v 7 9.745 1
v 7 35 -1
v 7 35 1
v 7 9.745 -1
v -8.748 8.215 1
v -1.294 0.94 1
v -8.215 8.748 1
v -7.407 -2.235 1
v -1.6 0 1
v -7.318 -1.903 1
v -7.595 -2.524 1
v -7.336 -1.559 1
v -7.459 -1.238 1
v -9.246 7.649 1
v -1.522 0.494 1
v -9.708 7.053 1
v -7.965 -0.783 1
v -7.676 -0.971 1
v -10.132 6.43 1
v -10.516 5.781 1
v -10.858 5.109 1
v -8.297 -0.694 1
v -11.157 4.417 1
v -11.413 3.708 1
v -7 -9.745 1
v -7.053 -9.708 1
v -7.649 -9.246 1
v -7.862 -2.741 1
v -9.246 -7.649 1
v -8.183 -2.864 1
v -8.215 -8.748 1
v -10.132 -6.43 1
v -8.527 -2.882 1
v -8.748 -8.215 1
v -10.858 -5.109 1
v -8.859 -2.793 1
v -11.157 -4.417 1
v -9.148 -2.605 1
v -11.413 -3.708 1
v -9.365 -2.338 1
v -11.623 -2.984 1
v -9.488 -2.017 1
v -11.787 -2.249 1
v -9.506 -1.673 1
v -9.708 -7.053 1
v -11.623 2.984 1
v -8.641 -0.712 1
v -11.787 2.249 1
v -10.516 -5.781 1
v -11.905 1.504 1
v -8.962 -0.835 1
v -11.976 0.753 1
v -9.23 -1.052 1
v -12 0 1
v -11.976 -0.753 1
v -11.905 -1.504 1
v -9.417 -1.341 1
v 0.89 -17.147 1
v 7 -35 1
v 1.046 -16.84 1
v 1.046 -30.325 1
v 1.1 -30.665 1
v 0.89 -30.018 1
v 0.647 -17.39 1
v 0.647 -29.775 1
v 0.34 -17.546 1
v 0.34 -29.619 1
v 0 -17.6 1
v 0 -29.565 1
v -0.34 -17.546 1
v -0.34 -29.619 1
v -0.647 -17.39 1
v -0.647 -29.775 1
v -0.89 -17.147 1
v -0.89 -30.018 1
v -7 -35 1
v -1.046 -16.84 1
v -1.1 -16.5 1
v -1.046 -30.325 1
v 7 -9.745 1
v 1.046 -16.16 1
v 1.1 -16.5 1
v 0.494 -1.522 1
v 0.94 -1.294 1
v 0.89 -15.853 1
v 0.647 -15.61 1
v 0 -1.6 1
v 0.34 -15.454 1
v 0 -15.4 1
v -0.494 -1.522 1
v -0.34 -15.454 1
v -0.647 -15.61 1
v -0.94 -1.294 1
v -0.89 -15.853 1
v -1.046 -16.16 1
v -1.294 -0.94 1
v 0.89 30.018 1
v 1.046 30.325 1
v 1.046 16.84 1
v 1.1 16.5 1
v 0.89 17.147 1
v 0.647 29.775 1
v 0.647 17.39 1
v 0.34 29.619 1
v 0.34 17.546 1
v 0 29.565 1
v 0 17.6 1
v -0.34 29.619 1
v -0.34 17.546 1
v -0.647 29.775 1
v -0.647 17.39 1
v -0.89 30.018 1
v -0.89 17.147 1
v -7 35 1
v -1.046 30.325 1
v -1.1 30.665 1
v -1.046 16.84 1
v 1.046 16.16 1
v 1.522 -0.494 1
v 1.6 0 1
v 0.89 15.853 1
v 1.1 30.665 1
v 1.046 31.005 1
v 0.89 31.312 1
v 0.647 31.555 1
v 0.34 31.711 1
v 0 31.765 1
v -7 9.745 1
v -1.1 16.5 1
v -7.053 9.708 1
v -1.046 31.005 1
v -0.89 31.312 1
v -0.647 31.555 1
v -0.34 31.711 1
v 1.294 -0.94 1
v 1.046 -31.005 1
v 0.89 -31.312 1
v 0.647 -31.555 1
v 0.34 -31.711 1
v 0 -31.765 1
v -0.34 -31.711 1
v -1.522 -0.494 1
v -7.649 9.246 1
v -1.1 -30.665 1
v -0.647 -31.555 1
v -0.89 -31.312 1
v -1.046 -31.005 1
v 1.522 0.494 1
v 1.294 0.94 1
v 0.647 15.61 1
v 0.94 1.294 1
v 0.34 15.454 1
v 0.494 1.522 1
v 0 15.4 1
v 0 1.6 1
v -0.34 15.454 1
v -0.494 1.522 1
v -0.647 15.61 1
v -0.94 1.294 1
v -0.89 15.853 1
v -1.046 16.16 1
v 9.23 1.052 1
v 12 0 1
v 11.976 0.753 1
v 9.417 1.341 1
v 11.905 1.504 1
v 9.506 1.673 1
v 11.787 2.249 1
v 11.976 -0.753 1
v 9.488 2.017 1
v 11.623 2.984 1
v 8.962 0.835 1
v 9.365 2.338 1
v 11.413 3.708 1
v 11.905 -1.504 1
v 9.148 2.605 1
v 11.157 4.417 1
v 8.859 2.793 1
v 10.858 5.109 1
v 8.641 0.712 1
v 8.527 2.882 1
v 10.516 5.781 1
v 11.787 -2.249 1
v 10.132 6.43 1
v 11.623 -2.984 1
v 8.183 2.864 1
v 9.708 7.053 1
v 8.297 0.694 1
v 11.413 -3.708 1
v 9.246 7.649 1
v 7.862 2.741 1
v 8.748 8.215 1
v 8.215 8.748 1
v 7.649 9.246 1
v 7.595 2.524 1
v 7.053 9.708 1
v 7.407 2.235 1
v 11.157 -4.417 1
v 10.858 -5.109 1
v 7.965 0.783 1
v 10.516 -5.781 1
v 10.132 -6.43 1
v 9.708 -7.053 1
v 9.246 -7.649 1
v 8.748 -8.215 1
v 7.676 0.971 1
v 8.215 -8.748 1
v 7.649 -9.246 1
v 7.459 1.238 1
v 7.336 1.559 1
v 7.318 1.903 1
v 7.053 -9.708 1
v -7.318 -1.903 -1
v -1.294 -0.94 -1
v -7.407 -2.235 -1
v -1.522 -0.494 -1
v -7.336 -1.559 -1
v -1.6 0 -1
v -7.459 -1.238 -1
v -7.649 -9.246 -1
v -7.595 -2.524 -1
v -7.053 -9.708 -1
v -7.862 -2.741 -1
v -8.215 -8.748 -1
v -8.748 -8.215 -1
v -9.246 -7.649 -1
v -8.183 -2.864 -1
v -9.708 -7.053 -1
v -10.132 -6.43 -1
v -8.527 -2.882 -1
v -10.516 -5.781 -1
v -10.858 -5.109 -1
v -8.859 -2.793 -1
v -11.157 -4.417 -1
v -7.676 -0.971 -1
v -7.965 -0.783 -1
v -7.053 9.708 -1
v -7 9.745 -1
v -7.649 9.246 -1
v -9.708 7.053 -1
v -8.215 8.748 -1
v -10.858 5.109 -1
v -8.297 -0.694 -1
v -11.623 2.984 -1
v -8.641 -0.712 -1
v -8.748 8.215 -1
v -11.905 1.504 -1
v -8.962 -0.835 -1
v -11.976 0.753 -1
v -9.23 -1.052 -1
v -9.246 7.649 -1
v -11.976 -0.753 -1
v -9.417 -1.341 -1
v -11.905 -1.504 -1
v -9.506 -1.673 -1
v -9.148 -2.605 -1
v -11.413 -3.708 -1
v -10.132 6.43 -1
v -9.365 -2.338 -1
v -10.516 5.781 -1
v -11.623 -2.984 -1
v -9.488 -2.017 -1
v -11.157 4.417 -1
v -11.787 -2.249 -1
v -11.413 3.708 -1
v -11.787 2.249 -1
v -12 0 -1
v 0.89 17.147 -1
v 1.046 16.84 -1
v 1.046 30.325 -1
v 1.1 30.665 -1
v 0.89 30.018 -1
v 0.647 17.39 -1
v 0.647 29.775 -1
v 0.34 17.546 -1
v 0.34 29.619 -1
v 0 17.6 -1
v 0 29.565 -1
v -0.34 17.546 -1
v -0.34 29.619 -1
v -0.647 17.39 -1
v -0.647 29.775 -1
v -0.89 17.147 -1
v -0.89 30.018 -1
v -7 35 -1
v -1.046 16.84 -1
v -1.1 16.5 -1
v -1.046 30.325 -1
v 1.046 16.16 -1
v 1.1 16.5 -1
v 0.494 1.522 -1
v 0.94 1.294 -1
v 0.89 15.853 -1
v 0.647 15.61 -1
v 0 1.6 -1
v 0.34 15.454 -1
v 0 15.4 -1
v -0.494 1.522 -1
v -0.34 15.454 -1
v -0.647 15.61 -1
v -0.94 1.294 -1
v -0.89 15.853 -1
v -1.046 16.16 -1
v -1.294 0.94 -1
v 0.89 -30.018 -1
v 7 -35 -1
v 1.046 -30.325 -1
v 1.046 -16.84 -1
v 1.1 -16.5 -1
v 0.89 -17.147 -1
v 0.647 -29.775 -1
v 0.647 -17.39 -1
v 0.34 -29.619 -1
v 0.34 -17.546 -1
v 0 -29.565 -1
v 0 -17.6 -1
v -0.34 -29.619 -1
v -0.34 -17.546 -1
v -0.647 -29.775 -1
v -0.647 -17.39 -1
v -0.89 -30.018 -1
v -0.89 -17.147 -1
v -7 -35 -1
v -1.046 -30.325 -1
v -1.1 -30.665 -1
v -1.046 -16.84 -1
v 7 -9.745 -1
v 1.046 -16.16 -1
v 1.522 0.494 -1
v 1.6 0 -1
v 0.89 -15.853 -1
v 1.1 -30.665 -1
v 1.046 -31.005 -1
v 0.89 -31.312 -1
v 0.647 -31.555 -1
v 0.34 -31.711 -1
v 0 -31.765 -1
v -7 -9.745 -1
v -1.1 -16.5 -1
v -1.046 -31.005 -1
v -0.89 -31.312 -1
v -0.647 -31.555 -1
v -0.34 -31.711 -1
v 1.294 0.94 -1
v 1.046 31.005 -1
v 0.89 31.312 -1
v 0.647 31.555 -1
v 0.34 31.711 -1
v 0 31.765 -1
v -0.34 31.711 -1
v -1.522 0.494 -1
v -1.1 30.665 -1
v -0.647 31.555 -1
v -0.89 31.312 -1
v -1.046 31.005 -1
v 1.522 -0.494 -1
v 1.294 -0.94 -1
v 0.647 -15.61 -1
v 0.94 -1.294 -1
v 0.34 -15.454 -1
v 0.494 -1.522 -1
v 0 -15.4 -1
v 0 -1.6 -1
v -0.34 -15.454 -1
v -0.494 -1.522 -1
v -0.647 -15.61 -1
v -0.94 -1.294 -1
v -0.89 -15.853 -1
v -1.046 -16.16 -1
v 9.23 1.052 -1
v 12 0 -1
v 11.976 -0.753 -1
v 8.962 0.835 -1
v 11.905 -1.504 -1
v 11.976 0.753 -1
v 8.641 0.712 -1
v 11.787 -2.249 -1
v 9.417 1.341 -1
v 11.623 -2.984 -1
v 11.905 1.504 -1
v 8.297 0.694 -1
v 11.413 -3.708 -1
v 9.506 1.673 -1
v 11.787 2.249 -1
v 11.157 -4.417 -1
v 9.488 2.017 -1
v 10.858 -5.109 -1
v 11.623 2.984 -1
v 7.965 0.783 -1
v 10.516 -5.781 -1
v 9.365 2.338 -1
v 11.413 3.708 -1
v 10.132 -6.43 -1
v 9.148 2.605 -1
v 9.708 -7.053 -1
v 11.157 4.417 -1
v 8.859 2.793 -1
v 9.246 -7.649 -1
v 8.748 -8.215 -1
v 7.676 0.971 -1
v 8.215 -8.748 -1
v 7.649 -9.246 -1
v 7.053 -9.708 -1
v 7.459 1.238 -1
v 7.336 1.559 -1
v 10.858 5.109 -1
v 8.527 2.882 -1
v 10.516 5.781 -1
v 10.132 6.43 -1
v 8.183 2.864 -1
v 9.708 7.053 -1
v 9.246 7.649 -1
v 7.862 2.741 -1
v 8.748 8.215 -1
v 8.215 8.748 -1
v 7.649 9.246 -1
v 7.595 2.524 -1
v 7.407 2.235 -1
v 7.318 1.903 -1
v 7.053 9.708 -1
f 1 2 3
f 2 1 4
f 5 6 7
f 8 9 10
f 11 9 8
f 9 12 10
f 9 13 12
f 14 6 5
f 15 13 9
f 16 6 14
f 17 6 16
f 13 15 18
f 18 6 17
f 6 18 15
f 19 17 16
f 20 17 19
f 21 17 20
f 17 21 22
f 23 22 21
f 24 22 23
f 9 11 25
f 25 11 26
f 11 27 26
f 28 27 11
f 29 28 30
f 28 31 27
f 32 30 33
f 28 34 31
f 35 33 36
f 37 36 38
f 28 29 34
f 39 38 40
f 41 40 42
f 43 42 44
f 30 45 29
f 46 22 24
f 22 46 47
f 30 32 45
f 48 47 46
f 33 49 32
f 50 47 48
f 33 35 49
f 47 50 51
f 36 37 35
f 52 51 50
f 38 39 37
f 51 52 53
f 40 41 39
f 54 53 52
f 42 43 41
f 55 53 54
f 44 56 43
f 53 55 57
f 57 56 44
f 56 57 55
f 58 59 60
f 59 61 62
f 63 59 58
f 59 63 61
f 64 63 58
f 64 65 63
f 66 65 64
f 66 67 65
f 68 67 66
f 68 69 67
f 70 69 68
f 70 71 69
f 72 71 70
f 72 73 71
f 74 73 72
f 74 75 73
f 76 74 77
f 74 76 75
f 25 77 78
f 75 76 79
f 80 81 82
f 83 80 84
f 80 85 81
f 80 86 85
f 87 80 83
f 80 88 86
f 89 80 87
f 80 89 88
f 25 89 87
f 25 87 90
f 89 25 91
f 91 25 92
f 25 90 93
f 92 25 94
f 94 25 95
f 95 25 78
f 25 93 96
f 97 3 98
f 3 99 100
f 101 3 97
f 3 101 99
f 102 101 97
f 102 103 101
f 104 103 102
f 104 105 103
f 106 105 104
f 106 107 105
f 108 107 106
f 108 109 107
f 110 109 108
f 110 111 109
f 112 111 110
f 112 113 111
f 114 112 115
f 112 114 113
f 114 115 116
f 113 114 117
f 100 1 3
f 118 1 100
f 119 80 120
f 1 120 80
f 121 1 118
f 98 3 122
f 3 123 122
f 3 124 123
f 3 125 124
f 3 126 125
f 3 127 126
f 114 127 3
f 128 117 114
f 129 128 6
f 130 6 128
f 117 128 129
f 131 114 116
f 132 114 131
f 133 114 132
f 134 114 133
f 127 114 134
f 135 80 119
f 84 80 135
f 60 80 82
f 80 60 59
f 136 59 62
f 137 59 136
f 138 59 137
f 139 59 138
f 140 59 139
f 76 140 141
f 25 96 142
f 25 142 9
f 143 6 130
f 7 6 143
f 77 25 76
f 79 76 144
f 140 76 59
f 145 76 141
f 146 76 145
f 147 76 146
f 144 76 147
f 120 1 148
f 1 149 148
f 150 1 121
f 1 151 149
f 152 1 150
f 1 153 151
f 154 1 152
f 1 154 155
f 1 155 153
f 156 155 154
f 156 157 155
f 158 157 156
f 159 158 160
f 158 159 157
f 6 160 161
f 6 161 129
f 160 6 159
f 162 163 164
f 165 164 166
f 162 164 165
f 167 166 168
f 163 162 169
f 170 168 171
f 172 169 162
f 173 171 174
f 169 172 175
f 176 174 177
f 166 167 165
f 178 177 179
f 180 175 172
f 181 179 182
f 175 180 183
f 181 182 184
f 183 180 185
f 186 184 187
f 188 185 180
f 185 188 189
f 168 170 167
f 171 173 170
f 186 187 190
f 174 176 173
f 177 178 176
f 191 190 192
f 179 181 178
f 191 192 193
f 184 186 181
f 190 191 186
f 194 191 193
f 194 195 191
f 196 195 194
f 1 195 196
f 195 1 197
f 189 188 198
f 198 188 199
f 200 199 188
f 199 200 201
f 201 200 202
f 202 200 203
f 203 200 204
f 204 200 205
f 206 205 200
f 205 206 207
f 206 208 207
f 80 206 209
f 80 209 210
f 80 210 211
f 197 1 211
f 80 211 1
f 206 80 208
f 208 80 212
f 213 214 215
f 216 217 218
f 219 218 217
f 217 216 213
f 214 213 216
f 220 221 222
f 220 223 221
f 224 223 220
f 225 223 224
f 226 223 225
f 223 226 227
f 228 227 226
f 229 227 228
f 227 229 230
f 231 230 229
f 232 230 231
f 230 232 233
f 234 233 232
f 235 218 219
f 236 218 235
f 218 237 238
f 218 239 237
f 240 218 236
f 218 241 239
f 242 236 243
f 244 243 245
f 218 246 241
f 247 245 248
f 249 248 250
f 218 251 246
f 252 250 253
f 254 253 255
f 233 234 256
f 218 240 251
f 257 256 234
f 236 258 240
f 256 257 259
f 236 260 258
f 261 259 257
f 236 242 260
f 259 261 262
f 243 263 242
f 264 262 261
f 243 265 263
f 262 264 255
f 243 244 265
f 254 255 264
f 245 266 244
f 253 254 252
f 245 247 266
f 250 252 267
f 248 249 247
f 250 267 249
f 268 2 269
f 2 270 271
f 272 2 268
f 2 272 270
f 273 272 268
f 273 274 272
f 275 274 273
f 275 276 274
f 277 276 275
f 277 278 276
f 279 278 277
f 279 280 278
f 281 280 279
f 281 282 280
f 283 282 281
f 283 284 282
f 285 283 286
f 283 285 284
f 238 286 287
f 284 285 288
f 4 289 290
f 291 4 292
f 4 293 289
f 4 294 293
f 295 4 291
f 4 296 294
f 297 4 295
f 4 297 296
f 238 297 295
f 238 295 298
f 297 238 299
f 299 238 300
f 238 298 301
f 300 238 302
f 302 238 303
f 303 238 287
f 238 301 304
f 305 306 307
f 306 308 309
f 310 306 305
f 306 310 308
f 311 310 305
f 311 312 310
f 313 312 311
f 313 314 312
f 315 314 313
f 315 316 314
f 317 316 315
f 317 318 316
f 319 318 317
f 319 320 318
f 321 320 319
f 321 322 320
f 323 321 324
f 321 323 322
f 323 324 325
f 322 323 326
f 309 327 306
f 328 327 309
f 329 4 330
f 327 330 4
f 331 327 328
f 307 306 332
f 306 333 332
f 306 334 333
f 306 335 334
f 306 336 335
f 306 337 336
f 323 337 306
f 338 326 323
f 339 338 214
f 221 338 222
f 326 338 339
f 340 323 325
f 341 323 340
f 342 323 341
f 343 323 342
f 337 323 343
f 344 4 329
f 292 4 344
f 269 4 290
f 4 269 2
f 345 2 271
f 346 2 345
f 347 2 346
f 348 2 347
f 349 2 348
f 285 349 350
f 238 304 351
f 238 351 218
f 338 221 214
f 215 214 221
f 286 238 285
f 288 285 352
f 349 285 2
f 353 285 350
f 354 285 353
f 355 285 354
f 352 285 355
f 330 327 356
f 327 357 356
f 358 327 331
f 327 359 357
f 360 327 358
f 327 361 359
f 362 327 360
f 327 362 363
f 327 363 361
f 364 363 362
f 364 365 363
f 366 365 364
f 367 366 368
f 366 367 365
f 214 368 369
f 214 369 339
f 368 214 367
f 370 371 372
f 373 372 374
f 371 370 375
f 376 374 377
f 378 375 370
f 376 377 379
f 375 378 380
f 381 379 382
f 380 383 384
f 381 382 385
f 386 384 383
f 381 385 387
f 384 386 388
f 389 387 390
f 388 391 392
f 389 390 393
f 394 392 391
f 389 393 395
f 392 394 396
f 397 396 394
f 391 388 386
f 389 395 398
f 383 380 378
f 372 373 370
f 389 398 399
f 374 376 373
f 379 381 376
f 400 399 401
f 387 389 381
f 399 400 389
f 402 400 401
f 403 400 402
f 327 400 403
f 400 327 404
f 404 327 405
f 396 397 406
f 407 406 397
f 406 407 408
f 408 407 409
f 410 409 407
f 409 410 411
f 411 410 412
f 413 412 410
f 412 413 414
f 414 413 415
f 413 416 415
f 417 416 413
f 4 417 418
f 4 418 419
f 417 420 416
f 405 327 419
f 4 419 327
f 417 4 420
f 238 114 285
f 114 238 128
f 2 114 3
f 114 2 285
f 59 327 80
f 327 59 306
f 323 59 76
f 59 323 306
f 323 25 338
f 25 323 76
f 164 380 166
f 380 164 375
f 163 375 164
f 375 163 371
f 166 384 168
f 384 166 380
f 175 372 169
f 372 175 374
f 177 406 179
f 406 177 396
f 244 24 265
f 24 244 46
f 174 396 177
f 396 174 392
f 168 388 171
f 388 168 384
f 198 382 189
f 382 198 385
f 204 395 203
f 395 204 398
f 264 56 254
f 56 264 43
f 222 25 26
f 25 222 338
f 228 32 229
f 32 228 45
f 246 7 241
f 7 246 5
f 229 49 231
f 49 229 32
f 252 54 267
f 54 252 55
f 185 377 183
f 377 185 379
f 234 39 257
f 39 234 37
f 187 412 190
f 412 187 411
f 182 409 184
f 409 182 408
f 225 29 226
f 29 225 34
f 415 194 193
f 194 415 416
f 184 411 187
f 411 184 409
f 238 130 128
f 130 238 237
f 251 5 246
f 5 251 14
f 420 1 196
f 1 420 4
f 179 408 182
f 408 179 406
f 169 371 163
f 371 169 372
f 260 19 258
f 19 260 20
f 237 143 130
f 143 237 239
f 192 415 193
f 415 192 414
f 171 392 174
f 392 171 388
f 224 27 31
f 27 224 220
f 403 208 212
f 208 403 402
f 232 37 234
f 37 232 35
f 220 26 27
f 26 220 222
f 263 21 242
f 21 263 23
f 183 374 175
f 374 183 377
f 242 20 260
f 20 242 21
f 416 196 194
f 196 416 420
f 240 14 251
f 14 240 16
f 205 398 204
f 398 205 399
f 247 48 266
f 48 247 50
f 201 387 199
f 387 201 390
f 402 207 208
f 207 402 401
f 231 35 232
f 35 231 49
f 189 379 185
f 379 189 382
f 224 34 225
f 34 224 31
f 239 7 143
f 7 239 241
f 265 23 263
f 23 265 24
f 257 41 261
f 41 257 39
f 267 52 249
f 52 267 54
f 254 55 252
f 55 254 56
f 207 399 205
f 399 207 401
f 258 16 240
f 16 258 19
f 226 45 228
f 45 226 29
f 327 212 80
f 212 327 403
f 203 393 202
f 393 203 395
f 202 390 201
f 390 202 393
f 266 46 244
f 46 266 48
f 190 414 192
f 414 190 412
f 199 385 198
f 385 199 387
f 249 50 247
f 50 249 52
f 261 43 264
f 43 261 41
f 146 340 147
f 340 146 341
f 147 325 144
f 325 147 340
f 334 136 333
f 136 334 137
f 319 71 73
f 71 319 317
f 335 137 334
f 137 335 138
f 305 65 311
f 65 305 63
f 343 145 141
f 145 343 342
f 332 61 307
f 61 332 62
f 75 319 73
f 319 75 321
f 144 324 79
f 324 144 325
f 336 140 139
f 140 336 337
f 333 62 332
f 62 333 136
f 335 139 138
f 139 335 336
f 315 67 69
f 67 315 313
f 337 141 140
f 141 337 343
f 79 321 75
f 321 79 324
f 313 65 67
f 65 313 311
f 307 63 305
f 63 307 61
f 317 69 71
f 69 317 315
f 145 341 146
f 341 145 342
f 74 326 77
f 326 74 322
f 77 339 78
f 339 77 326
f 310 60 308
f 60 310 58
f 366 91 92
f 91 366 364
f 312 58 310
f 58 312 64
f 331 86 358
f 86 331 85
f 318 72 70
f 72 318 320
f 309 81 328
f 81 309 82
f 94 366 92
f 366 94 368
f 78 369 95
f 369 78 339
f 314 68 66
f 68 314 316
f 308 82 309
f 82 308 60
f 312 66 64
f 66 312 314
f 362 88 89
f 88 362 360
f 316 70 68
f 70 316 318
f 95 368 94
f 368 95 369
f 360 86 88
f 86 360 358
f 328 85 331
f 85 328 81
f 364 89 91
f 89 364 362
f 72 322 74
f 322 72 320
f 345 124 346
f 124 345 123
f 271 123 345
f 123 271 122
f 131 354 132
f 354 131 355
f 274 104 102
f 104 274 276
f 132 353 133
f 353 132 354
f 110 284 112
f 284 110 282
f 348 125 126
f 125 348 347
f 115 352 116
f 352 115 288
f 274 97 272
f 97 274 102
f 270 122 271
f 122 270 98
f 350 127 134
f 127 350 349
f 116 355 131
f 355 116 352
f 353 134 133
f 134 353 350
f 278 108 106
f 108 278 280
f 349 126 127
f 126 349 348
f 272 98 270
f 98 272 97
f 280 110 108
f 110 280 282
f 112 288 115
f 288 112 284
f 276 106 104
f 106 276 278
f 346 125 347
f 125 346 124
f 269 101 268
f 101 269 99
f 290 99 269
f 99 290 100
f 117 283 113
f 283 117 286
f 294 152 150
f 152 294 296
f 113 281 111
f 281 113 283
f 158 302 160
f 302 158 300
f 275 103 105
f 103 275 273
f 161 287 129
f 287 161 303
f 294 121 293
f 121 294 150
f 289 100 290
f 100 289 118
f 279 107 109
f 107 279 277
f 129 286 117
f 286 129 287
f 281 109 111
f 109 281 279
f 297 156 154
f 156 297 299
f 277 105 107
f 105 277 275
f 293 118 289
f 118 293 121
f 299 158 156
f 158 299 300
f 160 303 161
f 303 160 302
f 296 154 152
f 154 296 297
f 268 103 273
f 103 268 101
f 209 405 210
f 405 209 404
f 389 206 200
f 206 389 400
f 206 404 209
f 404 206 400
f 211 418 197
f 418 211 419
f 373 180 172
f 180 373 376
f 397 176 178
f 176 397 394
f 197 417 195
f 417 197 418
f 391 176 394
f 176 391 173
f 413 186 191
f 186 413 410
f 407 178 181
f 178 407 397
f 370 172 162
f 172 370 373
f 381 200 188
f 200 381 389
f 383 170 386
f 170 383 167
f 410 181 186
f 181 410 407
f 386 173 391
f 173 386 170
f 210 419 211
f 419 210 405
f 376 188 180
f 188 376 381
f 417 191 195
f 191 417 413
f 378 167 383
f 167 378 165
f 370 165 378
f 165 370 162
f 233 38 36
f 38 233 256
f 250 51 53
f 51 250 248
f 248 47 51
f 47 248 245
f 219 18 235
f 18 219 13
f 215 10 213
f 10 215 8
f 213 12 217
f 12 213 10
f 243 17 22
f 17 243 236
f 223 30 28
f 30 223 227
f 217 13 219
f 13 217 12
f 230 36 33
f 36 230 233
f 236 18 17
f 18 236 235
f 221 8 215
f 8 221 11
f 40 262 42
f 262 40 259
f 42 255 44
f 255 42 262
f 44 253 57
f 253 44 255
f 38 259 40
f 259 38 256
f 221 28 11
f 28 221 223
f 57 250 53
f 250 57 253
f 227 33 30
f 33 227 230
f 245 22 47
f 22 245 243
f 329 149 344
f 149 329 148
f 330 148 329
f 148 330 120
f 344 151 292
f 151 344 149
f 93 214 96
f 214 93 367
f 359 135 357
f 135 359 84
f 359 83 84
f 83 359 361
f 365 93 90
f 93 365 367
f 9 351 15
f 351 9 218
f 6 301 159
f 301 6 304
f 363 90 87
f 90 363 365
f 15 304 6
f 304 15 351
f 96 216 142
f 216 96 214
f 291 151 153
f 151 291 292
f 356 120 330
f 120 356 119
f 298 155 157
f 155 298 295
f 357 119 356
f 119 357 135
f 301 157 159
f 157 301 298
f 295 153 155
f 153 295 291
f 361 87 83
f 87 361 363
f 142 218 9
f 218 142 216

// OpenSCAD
// file: ../../parameters.scad
global_clearance = 0.5;


//Main tube diameter - hole [mm]
main_tube_outer_diameter = 25.4;
main_tube_inner_diameter = 23.05;

// Nastavení parametrů rotoru

gliding_aggle = 14;         // tenhle úhel by se zřejmě v budoucnu měl počítat z požadované klouzavosti.

rotor_blade_AOA = 1.5;      // nastavení úhlu náběhu rotorového listu
rotor_blade_length = 970;   // délka rotorového listu
rotor_blade_depth = 50;     // hloubka rotorového listu
rotor_height = 180;         // výška otočného kloubu rotoru nad hlavní trubkou vírníku (odhad)
rotor_blades_count = 2;
rotor_delta_angle = 12;


rotor_head_width =  21.4;    //Rozměr 1 v nákresu
pilon_wall_thickness = 4.2;  // Rozměr 2 v nákresu
horizontal_screw_distance = 14.5;   // Rozměr 4 v nákresu
vertical_screw_distance = 12;       // rozměr 5 v nkresu

rotorhead_wall_thickness = 2; // sila tistenych dilu


bearing_outer_diameter = 7.1;    // Rozměr B1 v nákresu s přídavkem na toleranci otvoru
bearing_thickness = 3.1;        // Rozměr B2 v nákresu
bearing_shaft_length = 19.5;    // Rozměr B3 v nákresu


// nastavení parametrů motoru

engine_angle = -8;
engine_diameter = 55;
engine_offset = 55;

engine_screws_radius = 15;
engine_holes_radius = (24 + 44)/4;
engine_shatf_hole_diameter = 13;

// screw length step - minimum difference in length between two types of screws
basic_screw_length = 5;

//Screw diameter and nut for M5 [mm]
M5_screw_diameter=5.5;
M5_head_height = 5;
M5_head_diameter = 13+0.5;
M5_nut_height = 4.5;
M5_nut_diameter = 9.4;
M5_nut_pocket = 8.4;

//Screw diameter and nut for M4 [mm]
M4_screw_diameter=4.5;
M4_screw_head_height = 4;
M4_nut_height = 3.2;
M4_nut_diameter = 8.4;
M4_nut_pocket = 7.5;

//Screw diameter and nut for M3 [mm]
M3_screw_diameter = 3.2;
M3_nut_height = 2.7;
M3_nut_diameter = 6.6;
M3_screw_head_height = 3;
M3_nut_pocket = 5.6;


//Screw diameter and nut for M2,5 [mm]
M2_5_screw_diameter = 2.7;
M2_5_nut_height = 2.3;
M2_5_nut_diameter = 6;
M2_5_nut_pocket = 5.1;

//Screw diameter and nut for M2 [mm]
M2_screw_diameter = 2.2;
M2_nut_height = 1.8;
M2_nut_diameter = 4.5;
M2_nut_pocket = 3.95;



//šroub servo
Servo_screw = 1.5;
Servo_nut_height = 1;
Servo_nut_diameter = 2.7;



//center_of_gravity_position = [main_pilon_position - tan(gliding_aggle)*rotor_height, 0, 0];


////podzvozek

radius_undercarriage = 25;
vzdalenost_x = tan(20) * 131;
vzdalenost_y = (131 - radius_undercarriage)/tan(79);
uhel_y = 90 - 20;
uhel_x = 90 - 79;

maximum_printable_size = 150;


////Pitotova trubice
Pitot_tube_diameter = 4.02 + 1;
Distance_hole_from_tube = 11.92;  //vzdálenost otvoru pro připevnění od samotné trubičky
// file: ../888_1001.scad
//
//
//

include <../parameters.scad>

module 888_1001()
{
    angle_between_blades = 360 / rotor_blades_count;
    rotor_center_plate_size = 30;
    rotor_mounting_plate_size = 20;
    shaft_diameter = M3_screw_diameter;
    thickness = 2;
    blade_screws_distance = (16.47+11.86)/2;

    difference () {
        union () {
            cylinder(r = 3+9, h = thickness, center = true, $fn = 100);

            for (i = [0:rotor_blades_count]){
                rotate([0,0, i*angle_between_blades])
                    translate([0, 20, 0])
                        cube([14, 30, thickness], center = true);
            }
        }

        cylinder(d = shaft_diameter, h = 2* thickness, center = true, $fn = 20);


        for (i = [1:rotor_blades_count]){
            rotate([0,0, i*angle_between_blades])
                translate([0, 16.5 + blade_screws_distance/2, 0]) {
                    translate([0, blade_screws_distance/2, 0])
                        cylinder(d = M2_screw_diameter, h = 2* thickness, center = true, $fn = 20);
                    translate([0, -blade_screws_distance/2, 0])
                        cylinder(d = M2_screw_diameter, h = 2* thickness, center = true, $fn = 20);
                }
        }

        rotate([0,0, rotor_delta_angle])
        for (i = [1:rotor_blades_count]){
            rotate([0,0, i*angle_between_blades + angle_between_blades/2])
                translate([0, 3 + 4.5 + M2_screw_diameter/2, 0])
                    cylinder(d = M2_screw_diameter, h = 2* thickness, center = true, $fn = 20);
        }
    }
}

888_1001();
// main file
//
//
//

use <../888_1001.scad>

888_1001(hole_diameter=5);
